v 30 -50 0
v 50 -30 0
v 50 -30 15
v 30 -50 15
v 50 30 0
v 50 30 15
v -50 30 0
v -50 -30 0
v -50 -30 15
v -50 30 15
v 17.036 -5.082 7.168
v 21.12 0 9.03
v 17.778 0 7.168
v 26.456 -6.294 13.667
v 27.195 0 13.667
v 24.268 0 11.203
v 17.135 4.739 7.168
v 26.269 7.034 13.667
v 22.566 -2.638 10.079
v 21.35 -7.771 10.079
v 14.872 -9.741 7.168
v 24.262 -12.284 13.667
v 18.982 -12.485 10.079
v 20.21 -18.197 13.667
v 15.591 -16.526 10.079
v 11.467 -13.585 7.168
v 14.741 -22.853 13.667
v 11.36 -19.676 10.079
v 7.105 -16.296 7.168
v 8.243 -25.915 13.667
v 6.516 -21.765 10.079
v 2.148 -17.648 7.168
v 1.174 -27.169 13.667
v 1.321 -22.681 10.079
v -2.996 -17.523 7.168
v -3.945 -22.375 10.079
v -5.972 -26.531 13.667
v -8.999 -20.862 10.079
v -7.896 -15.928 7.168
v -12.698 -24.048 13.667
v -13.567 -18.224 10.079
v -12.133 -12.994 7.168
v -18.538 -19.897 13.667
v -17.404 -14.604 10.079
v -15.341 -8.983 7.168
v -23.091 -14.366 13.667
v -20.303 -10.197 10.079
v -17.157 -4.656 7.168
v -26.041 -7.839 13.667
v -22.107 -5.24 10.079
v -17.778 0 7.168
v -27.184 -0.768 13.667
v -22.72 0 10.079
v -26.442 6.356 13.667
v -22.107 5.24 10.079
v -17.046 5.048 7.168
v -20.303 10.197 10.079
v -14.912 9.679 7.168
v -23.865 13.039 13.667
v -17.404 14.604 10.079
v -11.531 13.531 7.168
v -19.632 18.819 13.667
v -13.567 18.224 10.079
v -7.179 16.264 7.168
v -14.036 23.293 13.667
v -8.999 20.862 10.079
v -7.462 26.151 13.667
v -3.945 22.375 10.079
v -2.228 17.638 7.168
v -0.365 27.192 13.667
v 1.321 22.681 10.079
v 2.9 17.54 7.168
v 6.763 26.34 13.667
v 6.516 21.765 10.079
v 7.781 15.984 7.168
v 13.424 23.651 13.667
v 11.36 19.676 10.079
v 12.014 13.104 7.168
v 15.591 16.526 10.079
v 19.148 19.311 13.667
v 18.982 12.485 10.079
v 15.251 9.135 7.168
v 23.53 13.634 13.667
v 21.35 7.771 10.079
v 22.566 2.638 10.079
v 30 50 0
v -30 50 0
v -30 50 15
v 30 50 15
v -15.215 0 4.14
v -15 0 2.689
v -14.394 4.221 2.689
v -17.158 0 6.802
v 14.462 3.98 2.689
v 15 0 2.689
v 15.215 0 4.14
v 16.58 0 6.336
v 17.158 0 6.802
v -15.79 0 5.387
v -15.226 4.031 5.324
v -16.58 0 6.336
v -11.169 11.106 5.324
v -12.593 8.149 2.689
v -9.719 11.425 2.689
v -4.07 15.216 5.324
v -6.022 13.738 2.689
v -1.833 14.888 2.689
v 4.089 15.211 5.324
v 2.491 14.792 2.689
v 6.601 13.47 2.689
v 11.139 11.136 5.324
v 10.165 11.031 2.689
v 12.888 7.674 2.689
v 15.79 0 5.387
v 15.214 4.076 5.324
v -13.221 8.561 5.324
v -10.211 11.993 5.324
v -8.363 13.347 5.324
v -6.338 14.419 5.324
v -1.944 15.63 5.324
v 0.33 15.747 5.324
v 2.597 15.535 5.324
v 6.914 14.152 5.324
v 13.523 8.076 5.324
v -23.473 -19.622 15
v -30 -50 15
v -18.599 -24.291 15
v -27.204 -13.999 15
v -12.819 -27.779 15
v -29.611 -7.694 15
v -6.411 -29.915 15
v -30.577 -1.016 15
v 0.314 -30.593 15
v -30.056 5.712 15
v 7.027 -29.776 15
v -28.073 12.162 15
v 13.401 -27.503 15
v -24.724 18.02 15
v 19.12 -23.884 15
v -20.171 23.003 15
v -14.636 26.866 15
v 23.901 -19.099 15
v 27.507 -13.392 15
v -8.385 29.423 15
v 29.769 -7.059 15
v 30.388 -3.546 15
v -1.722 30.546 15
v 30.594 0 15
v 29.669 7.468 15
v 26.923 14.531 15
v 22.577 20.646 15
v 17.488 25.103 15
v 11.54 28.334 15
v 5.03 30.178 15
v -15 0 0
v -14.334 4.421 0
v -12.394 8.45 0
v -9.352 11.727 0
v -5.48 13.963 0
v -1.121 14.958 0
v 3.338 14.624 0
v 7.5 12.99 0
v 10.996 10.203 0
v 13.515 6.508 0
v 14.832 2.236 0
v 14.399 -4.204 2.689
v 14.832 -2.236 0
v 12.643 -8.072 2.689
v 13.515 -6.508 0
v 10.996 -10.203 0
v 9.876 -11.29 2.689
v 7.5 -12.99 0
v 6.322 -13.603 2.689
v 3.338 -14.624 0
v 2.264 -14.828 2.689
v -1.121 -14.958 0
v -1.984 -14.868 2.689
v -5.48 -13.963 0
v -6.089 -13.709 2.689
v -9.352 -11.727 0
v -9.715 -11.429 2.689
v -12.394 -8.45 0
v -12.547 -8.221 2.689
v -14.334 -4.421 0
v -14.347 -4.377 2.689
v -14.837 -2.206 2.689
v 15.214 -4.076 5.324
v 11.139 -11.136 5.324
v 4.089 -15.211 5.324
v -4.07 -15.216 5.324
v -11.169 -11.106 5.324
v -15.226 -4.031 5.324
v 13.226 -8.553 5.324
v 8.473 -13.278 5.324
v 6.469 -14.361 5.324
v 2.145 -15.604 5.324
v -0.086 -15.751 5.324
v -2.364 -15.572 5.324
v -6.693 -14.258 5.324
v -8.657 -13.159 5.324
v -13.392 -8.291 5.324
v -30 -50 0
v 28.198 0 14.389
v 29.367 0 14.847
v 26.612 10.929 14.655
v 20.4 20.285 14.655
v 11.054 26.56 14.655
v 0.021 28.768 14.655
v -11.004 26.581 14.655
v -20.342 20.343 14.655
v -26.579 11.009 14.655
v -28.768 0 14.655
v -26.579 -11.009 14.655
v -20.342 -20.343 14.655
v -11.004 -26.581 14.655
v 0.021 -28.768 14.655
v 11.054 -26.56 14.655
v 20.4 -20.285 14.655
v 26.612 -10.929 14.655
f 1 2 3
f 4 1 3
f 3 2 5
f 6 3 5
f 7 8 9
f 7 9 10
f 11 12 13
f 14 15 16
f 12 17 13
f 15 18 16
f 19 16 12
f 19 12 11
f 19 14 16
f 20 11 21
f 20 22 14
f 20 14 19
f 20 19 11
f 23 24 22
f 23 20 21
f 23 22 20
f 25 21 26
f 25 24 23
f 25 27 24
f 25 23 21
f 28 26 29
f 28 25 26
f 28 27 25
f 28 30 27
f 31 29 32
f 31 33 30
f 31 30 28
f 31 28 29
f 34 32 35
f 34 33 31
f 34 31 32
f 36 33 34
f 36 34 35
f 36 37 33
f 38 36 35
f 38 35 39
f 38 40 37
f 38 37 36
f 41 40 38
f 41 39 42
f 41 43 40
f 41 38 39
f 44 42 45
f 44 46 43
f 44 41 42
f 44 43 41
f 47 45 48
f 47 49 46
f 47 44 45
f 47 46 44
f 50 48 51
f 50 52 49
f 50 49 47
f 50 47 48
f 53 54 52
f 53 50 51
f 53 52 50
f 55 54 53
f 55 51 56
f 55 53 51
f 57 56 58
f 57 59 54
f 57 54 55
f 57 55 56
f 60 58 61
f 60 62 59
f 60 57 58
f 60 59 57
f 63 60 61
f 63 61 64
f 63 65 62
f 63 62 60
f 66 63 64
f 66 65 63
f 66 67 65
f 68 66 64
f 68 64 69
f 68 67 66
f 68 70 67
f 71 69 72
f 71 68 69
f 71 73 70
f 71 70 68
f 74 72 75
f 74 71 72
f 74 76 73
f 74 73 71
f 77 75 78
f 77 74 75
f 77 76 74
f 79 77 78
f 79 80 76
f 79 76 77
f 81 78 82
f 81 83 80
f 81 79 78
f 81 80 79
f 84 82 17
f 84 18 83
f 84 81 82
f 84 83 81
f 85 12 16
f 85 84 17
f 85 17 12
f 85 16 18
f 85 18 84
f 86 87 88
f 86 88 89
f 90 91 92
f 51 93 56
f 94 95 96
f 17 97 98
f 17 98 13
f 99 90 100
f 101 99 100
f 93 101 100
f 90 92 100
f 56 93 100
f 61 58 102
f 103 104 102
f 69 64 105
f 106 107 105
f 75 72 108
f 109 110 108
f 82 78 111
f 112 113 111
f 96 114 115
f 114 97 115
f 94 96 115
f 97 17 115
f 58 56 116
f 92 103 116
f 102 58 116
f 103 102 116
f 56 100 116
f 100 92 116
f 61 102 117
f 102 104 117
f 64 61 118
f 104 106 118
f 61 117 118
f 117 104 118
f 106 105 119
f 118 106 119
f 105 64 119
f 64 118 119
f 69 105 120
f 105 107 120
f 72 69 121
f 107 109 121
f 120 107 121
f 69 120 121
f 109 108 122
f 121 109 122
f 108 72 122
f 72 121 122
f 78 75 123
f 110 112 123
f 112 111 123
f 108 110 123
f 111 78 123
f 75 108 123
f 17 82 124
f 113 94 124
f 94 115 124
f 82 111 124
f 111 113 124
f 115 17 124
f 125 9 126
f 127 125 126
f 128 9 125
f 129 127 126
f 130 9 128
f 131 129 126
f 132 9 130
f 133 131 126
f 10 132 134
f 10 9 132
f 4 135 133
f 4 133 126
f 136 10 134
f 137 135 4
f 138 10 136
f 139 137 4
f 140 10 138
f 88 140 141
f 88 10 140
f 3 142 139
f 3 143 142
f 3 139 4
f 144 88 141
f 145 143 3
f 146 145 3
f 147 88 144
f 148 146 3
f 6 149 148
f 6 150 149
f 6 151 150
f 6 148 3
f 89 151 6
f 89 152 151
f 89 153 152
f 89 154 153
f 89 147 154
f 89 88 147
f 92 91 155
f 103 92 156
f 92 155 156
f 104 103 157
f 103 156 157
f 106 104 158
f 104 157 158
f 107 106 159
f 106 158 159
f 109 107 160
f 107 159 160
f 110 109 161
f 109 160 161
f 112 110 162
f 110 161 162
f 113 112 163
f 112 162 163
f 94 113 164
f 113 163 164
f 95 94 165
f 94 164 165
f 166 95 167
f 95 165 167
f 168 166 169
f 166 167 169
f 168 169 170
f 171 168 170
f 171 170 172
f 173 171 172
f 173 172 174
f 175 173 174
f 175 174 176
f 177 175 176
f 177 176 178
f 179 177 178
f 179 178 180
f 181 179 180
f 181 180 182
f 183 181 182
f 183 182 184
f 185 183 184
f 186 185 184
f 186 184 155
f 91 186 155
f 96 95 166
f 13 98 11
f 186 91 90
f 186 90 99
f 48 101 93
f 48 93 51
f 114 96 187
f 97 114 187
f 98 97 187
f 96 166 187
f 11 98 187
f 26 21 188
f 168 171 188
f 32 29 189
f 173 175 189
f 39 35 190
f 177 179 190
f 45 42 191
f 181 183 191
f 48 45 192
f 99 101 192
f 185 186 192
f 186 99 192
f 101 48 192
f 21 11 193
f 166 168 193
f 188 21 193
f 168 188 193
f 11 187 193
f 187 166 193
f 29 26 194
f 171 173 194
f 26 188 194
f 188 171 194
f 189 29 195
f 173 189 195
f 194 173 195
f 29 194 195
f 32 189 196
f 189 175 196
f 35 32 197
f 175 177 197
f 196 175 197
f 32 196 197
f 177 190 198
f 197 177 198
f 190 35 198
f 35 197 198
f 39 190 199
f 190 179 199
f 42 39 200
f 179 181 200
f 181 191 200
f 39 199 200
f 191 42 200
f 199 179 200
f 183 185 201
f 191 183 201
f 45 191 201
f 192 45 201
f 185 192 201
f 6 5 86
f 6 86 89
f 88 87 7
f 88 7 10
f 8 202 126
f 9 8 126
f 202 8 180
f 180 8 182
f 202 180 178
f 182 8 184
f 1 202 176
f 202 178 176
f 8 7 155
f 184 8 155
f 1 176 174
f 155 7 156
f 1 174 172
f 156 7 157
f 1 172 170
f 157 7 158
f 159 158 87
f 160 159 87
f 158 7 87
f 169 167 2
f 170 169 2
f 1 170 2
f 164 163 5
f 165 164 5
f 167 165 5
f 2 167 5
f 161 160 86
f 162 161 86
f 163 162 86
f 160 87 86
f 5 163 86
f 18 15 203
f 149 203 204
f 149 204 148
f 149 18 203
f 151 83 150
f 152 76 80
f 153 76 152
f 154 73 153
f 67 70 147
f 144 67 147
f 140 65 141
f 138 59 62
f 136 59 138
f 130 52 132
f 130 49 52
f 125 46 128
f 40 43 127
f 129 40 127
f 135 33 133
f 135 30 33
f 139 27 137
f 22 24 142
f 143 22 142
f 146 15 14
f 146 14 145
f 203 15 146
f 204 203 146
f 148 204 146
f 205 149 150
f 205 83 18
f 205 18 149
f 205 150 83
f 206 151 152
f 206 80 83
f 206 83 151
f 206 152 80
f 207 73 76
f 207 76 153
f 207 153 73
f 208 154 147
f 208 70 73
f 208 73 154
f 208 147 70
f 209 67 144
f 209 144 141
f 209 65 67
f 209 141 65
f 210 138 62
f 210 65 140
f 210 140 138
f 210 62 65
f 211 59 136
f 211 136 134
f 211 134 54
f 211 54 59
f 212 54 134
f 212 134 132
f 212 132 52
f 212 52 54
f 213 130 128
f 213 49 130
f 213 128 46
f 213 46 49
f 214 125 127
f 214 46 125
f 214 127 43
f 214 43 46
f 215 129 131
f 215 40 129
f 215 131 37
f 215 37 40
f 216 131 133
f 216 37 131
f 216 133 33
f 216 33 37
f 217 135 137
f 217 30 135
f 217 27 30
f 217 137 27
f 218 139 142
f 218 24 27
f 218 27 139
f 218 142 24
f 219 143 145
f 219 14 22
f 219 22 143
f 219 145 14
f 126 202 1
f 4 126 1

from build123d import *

# Parameters (mm, degrees)
SKETCH_2_W         = 100
SKETCH_2_H         = 100
EXTRUDE_1_DEPTH    = 15
SKETCH3_R          = 15
CUT_EXTRUDE1_DEPTH = 73.284161474
CHAMFER_1_SIZE     = 20
FILLET1_R          = 5
FILLET_1_R         = 5


with BuildPart() as part:
    # ｽｹｯﾁ2 → ﾎﾞｽ - 押し出し1 (new body)
    with BuildSketch(Plane.XY):
        Rectangle(SKETCH_2_W, SKETCH_2_H)
    extrude(amount=EXTRUDE_1_DEPTH)

    # ｽｹｯﾁ3 → ｶｯﾄ - 回転1 (revolve, cut)
    with BuildSketch(Plane(origin=(0, 0, 0), x_dir=(1, 0, 0), z_dir=(0, 1, 0))):
        with BuildLine():
            Line((0, -83), (0, -3))
            ThreePointArc((0, -3), (40, -43), (0, -83))
        make_face()
    revolve(axis=Axis((0, 0, 83), (0, 0, -1)), mode=Mode.SUBTRACT)

    # Sketch3 → Cut-Extrude1 (cut, through all)
    with BuildSketch(Plane(origin=(0, 0, 0), x_dir=(-1, 0, 0), z_dir=(0, 0, -1))):
        Circle(SKETCH3_R)
    extrude(amount=-CUT_EXTRUDE1_DEPTH, mode=Mode.SUBTRACT)

    # 面取り1
    chamfer_1_edges = [part.edges().sort_by_distance(p)[0] for p in [
        (50, -50, 7.5),
        (-50, -50, 7.5),
        (-50, 50, 7.5),
        (50, 50, 7.5),
    ]]
    chamfer(chamfer_1_edges, length=CHAMFER_1_SIZE)

    # Fillet1
    fillet1_edges = [part.edges().sort_by_distance(p)[0] for p in [
        (0, -15, 5.919007565),
    ]]
    fillet(fillet1_edges, radius=FILLET1_R)

    # ﾌｨﾚｯﾄ1
    fillet_1_edges = [part.edges().sort_by_distance(p)[0] for p in [
        (-28.565713714, 0, 15),
    ]]
    fillet(fillet_1_edges, radius=FILLET_1_R)


solid = part.part
